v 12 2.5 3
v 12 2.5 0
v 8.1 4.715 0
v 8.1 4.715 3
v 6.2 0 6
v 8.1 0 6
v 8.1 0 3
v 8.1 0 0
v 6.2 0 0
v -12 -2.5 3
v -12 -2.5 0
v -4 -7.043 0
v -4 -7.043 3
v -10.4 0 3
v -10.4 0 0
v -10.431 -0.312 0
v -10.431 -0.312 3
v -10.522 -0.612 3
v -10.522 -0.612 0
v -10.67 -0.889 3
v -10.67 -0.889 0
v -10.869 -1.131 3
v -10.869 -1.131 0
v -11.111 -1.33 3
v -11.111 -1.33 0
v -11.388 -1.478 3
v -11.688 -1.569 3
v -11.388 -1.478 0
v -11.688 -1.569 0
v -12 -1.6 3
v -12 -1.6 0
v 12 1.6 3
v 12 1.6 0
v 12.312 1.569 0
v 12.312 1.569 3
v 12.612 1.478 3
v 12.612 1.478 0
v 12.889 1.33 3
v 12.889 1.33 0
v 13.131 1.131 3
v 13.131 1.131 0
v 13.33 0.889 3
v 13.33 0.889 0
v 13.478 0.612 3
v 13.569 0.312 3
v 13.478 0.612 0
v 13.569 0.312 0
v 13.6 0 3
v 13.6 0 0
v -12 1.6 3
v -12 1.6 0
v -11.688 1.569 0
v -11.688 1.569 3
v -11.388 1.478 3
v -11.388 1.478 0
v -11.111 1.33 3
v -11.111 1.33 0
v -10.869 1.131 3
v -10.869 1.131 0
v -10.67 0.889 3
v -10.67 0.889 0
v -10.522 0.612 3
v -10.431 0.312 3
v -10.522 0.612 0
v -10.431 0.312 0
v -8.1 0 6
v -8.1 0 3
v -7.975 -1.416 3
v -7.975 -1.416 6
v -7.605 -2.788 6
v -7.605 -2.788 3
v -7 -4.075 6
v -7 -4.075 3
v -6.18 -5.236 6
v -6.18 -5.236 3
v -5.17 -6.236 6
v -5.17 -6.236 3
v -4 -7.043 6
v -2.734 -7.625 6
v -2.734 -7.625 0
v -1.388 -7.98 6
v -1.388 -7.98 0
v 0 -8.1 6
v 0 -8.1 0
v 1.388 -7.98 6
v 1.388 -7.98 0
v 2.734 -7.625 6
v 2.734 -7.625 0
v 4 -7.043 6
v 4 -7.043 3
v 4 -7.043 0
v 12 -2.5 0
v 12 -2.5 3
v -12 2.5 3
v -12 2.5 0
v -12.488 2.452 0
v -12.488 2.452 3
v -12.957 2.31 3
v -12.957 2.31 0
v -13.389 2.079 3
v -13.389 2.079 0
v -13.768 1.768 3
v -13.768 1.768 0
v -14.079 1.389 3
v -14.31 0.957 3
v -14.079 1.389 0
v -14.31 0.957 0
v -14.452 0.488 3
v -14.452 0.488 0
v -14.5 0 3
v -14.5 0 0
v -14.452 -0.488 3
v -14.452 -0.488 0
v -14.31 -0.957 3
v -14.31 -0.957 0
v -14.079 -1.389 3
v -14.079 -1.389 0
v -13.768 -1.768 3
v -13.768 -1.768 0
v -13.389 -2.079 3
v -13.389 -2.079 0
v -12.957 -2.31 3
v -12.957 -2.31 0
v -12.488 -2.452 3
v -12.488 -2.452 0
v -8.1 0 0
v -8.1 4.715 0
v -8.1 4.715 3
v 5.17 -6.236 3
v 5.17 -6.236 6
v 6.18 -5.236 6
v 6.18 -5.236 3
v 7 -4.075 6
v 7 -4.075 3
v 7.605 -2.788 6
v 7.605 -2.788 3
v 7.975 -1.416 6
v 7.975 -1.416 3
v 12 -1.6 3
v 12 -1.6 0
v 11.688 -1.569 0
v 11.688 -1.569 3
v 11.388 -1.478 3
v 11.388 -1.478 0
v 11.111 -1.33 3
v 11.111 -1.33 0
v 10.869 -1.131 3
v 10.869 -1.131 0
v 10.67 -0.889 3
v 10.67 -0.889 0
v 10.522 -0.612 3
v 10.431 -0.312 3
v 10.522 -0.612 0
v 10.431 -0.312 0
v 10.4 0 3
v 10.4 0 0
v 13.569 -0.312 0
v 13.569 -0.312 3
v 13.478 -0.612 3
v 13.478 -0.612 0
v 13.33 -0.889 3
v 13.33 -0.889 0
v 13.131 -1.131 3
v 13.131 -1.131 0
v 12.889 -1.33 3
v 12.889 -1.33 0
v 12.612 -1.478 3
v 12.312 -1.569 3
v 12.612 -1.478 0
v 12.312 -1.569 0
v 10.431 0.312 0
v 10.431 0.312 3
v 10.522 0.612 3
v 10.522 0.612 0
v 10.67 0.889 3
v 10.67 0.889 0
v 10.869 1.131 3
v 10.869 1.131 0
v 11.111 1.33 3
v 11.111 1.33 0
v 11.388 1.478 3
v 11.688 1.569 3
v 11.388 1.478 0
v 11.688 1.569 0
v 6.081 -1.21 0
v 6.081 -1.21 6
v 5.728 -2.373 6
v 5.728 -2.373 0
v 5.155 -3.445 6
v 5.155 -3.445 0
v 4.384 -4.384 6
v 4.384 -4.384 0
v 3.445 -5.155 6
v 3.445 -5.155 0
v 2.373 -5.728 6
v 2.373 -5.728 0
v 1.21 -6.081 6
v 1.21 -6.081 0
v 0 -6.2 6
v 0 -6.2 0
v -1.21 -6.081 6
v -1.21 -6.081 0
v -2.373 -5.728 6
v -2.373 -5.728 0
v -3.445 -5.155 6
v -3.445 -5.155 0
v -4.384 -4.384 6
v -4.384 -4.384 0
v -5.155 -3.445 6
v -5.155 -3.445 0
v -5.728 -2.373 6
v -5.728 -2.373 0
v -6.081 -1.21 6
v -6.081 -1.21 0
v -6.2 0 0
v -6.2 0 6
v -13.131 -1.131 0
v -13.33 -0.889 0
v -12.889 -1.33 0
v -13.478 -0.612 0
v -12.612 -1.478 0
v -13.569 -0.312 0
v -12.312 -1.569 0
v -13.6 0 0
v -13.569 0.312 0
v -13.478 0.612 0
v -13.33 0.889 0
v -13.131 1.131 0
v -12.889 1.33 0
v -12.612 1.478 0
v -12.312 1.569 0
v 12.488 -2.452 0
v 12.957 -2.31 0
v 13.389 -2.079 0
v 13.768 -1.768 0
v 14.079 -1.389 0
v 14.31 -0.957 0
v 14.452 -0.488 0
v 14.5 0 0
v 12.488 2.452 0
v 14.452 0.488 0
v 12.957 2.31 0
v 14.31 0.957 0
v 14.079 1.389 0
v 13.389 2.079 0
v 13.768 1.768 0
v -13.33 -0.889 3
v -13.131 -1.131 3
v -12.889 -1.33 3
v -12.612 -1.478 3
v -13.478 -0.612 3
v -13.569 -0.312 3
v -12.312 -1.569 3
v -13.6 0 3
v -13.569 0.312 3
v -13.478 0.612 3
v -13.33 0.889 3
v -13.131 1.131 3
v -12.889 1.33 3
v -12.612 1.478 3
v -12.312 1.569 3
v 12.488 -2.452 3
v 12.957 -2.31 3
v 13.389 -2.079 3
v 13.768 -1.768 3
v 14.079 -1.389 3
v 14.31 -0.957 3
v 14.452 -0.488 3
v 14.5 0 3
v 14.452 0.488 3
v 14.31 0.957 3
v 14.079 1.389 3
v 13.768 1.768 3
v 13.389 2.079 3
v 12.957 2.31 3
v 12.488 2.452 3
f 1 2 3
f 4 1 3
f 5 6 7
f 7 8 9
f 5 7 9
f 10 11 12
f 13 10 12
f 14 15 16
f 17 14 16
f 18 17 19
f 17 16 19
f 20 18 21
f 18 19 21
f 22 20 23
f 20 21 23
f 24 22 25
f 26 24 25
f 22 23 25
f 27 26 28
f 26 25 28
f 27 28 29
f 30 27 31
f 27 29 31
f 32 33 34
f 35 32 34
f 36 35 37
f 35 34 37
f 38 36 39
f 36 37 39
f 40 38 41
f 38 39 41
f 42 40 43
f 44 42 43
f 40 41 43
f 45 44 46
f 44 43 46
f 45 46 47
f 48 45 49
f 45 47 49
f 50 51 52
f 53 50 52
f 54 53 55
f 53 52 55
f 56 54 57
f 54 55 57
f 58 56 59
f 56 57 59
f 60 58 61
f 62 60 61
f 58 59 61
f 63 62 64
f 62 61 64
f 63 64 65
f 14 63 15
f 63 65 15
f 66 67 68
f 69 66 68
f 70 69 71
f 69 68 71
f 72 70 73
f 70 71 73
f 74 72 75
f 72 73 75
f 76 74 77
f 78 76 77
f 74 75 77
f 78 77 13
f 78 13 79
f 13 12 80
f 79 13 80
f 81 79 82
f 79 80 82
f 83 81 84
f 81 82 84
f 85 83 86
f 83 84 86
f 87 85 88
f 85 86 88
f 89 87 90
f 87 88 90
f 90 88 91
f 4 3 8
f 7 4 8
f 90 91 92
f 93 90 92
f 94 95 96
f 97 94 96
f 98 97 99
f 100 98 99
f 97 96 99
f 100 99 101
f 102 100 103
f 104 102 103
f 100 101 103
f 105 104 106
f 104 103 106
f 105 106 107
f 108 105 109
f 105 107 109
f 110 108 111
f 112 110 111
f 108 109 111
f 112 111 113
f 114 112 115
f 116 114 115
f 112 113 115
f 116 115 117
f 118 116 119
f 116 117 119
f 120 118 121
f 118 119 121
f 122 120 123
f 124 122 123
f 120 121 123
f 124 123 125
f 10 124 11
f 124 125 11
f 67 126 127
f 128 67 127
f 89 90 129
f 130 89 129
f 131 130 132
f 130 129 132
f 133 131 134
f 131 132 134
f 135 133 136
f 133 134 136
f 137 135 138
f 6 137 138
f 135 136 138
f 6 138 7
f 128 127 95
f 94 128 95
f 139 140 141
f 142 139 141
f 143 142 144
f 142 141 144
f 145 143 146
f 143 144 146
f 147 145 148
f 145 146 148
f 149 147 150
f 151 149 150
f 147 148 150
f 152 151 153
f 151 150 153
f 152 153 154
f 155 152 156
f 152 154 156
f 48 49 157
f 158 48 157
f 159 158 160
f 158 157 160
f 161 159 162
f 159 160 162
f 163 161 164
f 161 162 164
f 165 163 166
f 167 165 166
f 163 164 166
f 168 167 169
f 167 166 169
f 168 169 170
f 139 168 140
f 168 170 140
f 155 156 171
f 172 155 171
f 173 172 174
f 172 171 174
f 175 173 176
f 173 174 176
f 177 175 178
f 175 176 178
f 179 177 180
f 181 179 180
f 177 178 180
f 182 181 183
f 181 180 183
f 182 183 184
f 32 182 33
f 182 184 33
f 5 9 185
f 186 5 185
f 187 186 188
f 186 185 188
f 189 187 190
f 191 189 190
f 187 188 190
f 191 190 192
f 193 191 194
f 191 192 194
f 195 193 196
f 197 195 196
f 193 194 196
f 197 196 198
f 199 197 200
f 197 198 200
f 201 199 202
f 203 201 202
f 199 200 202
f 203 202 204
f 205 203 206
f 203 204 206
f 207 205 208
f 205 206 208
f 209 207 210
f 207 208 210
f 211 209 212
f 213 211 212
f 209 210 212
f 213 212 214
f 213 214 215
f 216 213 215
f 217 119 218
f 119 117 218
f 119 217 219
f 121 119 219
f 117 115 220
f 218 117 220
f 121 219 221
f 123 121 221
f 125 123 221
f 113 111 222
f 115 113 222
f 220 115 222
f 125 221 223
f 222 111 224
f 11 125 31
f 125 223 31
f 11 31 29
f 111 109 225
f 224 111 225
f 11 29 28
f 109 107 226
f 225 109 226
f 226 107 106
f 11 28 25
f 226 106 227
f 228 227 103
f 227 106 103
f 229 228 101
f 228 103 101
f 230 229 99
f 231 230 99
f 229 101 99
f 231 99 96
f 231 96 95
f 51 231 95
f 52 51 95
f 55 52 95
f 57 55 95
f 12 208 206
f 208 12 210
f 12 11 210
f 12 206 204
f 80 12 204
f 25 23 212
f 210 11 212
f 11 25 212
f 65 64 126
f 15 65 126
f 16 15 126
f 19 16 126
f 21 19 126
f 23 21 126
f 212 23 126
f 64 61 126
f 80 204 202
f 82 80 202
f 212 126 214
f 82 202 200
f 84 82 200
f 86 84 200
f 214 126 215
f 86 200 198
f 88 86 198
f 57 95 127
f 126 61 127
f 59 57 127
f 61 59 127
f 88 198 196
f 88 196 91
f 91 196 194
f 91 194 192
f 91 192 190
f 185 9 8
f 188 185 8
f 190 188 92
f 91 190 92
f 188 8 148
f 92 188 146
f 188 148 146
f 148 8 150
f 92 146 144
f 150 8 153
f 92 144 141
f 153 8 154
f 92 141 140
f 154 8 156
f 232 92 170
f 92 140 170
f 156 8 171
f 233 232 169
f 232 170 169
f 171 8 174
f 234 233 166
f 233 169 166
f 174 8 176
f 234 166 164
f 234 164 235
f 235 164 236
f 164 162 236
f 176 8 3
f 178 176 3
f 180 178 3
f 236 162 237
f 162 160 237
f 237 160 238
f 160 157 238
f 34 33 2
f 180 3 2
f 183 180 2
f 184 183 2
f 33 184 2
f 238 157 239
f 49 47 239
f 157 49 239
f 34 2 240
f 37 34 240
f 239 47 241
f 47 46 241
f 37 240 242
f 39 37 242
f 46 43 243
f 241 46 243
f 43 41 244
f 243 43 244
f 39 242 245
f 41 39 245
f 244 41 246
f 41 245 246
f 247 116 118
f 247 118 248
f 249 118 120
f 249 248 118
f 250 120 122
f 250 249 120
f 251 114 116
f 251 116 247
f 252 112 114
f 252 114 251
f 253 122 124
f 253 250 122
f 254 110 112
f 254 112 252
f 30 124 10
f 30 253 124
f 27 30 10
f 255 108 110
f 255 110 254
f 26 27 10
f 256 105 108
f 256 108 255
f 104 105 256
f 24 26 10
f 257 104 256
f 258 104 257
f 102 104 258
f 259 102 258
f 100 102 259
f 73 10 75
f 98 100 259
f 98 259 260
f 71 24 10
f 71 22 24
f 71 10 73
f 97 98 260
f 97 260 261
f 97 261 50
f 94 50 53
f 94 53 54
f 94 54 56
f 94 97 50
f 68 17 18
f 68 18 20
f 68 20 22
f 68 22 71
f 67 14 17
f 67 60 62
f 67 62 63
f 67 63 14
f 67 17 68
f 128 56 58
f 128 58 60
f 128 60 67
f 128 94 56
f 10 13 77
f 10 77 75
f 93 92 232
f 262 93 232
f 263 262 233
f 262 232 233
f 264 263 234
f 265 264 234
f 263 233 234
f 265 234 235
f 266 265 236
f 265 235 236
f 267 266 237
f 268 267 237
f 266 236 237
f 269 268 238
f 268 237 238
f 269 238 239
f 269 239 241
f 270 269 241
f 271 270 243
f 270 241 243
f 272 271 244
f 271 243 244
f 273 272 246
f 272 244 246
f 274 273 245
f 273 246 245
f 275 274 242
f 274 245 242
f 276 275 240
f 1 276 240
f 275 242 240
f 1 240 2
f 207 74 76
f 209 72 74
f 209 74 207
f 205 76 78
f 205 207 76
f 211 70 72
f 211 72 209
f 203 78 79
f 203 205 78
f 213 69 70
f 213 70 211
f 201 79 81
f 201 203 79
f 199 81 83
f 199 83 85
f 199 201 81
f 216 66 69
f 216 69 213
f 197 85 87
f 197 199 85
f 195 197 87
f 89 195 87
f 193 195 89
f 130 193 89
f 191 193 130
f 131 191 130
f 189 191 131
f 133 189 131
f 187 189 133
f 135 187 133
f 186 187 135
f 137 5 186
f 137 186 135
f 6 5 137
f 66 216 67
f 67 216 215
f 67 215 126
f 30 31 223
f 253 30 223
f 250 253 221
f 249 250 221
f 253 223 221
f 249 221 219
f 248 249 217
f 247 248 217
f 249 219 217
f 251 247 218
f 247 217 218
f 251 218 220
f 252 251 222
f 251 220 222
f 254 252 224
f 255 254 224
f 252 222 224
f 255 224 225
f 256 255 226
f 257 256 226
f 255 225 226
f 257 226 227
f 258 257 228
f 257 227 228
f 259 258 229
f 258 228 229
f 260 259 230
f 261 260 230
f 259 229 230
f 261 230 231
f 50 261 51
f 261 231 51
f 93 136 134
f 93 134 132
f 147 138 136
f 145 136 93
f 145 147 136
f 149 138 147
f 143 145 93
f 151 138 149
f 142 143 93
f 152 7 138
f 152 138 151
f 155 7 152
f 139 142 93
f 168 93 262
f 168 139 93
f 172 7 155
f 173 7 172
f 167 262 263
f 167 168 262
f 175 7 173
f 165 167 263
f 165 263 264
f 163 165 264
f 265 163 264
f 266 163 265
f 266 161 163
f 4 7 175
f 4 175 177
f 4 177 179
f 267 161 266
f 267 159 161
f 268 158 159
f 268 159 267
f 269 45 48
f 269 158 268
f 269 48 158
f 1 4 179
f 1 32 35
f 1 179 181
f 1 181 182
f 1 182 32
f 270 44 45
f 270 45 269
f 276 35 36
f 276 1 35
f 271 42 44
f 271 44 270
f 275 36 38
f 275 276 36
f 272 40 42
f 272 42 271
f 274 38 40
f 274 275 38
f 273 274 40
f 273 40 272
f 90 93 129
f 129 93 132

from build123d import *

# Parameters (mm, degrees)
F1_DEPTH = 6
F2_DEPTH = 3


with BuildPart() as f1:
    # F0 (on Top) → F1 (new body)
    with BuildSketch(Plane.XY):
        with BuildLine():
            Line((8.1, 0), (6.2, 0))
            ThreePointArc((6.2, 0), (0, -6.2), (-6.2, 0))
            Line((-6.2, 0), (-8.1, 0))
            ThreePointArc((-8.1, 0), (-7.0003956389, -4.074857163), (-4.0001331115, -7.0433610649))
            ThreePointArc((-4.0001331115, -7.0433610649), (0, -8.1), (4.0001331115, -7.0433610649))
            ThreePointArc((4.0001331115, -7.0433610649), (7.0003956389, -4.074857163), (8.1, 0))
        make_face()
    extrude(amount=F1_DEPTH)

    # F0 (on Top) → F2 (join)
    with BuildSketch(Plane.XY):
        with BuildLine():
            Line((9.5, 0), (8.1, 0))
            ThreePointArc((8.1, 0), (7.0003956389, -4.074857163), (4.0001331115, -7.0433610649))
            Line((4.0001331115, -7.0433610649), (12, -2.5))
            ThreePointArc((12, -2.5), (10.232233047, -1.767766953), (9.5, 0))
        make_face()
        with BuildLine():
            Line((10.4, 0), (9.5, 0))
            ThreePointArc((9.5, 0), (10.232233047, -1.767766953), (12, -2.5))
            Line((12, -2.5), (12, -1.6))
            ThreePointArc((12, -1.6), (10.8686291501, -1.1313708499), (10.4, 0))
        make_face()
        with BuildLine():
            Line((12, -1.6), (12, -2.5))
            ThreePointArc((12, -2.5), (13.767766953, -1.767766953), (14.5, 0))
            ThreePointArc((14.5, 0), (13.767766953, 1.767766953), (12, 2.5))
            Line((12, 2.5), (12, 1.6))
            ThreePointArc((12, 1.6), (13.1313708499, 1.1313708499), (13.6, 0))
            ThreePointArc((13.6, 0), (13.1313708499, -1.1313708499), (12, -1.6))
        make_face()
        with BuildLine():
            ThreePointArc((-4.0001331115, -7.0433610649), (-7.0003956389, -4.074857163), (-8.1, 0))
            Line((-8.1, 0), (-9.5, 0))
            ThreePointArc((-9.5, 0), (-10.232233047, -1.767766953), (-12, -2.5))
            Line((-12, -2.5), (-4.0001331115, -7.0433610649))
        make_face()
        with BuildLine():
            ThreePointArc((12, 2.5), (10.232233047, 1.767766953), (9.5, 0))
            Line((9.5, 0), (10.4, 0))
            ThreePointArc((10.4, 0), (10.8686291501, 1.1313708499), (12, 1.6))
            Line((12, 1.6), (12, 2.5))
        make_face()
        with BuildLine():
            ThreePointArc((-12, -2.5), (-10.232233047, -1.767766953), (-9.5, 0))
            Line((-9.5, 0), (-10.4, 0))
            ThreePointArc((-10.4, 0), (-10.8686291501, -1.1313708499), (-12, -1.6))
            Line((-12, -1.6), (-12, -2.5))
        make_face()
        with BuildLine():
            ThreePointArc((-12, 2.5), (-14.5, 0), (-12, -2.5))
            Line((-12, -2.5), (-12, -1.6))
            ThreePointArc((-12, -1.6), (-13.6, 0), (-12, 1.6))
            Line((-12, 1.6), (-12, 2.5))
        make_face()
        with BuildLine():
            Line((-10.4, 0), (-9.5, 0))
            ThreePointArc((-9.5, 0), (-10.232233047, 1.767766953), (-12, 2.5))
            Line((-12, 2.5), (-12, 1.6))
            ThreePointArc((-12, 1.6), (-10.8686291501, 1.1313708499), (-10.4, 0))
        make_face()
        with BuildLine():
            Line((-9.5, 0), (-8.1, 0))
            Line((-8.1, 0), (-8.1, 4.7149253731))
            Line((-8.1, 4.7149253731), (-12, 2.5))
            ThreePointArc((-12, 2.5), (-10.232233047, 1.767766953), (-9.5, 0))
        make_face()
        with BuildLine():
            Line((8.1, 4.7149253731), (8.1, 0))
            Line((8.1, 0), (9.5, 0))
            ThreePointArc((9.5, 0), (10.232233047, 1.767766953), (12, 2.5))
            Line((12, 2.5), (8.1, 4.7149253731))
        make_face()
    extrude(amount=F2_DEPTH)


solid = f1.part
